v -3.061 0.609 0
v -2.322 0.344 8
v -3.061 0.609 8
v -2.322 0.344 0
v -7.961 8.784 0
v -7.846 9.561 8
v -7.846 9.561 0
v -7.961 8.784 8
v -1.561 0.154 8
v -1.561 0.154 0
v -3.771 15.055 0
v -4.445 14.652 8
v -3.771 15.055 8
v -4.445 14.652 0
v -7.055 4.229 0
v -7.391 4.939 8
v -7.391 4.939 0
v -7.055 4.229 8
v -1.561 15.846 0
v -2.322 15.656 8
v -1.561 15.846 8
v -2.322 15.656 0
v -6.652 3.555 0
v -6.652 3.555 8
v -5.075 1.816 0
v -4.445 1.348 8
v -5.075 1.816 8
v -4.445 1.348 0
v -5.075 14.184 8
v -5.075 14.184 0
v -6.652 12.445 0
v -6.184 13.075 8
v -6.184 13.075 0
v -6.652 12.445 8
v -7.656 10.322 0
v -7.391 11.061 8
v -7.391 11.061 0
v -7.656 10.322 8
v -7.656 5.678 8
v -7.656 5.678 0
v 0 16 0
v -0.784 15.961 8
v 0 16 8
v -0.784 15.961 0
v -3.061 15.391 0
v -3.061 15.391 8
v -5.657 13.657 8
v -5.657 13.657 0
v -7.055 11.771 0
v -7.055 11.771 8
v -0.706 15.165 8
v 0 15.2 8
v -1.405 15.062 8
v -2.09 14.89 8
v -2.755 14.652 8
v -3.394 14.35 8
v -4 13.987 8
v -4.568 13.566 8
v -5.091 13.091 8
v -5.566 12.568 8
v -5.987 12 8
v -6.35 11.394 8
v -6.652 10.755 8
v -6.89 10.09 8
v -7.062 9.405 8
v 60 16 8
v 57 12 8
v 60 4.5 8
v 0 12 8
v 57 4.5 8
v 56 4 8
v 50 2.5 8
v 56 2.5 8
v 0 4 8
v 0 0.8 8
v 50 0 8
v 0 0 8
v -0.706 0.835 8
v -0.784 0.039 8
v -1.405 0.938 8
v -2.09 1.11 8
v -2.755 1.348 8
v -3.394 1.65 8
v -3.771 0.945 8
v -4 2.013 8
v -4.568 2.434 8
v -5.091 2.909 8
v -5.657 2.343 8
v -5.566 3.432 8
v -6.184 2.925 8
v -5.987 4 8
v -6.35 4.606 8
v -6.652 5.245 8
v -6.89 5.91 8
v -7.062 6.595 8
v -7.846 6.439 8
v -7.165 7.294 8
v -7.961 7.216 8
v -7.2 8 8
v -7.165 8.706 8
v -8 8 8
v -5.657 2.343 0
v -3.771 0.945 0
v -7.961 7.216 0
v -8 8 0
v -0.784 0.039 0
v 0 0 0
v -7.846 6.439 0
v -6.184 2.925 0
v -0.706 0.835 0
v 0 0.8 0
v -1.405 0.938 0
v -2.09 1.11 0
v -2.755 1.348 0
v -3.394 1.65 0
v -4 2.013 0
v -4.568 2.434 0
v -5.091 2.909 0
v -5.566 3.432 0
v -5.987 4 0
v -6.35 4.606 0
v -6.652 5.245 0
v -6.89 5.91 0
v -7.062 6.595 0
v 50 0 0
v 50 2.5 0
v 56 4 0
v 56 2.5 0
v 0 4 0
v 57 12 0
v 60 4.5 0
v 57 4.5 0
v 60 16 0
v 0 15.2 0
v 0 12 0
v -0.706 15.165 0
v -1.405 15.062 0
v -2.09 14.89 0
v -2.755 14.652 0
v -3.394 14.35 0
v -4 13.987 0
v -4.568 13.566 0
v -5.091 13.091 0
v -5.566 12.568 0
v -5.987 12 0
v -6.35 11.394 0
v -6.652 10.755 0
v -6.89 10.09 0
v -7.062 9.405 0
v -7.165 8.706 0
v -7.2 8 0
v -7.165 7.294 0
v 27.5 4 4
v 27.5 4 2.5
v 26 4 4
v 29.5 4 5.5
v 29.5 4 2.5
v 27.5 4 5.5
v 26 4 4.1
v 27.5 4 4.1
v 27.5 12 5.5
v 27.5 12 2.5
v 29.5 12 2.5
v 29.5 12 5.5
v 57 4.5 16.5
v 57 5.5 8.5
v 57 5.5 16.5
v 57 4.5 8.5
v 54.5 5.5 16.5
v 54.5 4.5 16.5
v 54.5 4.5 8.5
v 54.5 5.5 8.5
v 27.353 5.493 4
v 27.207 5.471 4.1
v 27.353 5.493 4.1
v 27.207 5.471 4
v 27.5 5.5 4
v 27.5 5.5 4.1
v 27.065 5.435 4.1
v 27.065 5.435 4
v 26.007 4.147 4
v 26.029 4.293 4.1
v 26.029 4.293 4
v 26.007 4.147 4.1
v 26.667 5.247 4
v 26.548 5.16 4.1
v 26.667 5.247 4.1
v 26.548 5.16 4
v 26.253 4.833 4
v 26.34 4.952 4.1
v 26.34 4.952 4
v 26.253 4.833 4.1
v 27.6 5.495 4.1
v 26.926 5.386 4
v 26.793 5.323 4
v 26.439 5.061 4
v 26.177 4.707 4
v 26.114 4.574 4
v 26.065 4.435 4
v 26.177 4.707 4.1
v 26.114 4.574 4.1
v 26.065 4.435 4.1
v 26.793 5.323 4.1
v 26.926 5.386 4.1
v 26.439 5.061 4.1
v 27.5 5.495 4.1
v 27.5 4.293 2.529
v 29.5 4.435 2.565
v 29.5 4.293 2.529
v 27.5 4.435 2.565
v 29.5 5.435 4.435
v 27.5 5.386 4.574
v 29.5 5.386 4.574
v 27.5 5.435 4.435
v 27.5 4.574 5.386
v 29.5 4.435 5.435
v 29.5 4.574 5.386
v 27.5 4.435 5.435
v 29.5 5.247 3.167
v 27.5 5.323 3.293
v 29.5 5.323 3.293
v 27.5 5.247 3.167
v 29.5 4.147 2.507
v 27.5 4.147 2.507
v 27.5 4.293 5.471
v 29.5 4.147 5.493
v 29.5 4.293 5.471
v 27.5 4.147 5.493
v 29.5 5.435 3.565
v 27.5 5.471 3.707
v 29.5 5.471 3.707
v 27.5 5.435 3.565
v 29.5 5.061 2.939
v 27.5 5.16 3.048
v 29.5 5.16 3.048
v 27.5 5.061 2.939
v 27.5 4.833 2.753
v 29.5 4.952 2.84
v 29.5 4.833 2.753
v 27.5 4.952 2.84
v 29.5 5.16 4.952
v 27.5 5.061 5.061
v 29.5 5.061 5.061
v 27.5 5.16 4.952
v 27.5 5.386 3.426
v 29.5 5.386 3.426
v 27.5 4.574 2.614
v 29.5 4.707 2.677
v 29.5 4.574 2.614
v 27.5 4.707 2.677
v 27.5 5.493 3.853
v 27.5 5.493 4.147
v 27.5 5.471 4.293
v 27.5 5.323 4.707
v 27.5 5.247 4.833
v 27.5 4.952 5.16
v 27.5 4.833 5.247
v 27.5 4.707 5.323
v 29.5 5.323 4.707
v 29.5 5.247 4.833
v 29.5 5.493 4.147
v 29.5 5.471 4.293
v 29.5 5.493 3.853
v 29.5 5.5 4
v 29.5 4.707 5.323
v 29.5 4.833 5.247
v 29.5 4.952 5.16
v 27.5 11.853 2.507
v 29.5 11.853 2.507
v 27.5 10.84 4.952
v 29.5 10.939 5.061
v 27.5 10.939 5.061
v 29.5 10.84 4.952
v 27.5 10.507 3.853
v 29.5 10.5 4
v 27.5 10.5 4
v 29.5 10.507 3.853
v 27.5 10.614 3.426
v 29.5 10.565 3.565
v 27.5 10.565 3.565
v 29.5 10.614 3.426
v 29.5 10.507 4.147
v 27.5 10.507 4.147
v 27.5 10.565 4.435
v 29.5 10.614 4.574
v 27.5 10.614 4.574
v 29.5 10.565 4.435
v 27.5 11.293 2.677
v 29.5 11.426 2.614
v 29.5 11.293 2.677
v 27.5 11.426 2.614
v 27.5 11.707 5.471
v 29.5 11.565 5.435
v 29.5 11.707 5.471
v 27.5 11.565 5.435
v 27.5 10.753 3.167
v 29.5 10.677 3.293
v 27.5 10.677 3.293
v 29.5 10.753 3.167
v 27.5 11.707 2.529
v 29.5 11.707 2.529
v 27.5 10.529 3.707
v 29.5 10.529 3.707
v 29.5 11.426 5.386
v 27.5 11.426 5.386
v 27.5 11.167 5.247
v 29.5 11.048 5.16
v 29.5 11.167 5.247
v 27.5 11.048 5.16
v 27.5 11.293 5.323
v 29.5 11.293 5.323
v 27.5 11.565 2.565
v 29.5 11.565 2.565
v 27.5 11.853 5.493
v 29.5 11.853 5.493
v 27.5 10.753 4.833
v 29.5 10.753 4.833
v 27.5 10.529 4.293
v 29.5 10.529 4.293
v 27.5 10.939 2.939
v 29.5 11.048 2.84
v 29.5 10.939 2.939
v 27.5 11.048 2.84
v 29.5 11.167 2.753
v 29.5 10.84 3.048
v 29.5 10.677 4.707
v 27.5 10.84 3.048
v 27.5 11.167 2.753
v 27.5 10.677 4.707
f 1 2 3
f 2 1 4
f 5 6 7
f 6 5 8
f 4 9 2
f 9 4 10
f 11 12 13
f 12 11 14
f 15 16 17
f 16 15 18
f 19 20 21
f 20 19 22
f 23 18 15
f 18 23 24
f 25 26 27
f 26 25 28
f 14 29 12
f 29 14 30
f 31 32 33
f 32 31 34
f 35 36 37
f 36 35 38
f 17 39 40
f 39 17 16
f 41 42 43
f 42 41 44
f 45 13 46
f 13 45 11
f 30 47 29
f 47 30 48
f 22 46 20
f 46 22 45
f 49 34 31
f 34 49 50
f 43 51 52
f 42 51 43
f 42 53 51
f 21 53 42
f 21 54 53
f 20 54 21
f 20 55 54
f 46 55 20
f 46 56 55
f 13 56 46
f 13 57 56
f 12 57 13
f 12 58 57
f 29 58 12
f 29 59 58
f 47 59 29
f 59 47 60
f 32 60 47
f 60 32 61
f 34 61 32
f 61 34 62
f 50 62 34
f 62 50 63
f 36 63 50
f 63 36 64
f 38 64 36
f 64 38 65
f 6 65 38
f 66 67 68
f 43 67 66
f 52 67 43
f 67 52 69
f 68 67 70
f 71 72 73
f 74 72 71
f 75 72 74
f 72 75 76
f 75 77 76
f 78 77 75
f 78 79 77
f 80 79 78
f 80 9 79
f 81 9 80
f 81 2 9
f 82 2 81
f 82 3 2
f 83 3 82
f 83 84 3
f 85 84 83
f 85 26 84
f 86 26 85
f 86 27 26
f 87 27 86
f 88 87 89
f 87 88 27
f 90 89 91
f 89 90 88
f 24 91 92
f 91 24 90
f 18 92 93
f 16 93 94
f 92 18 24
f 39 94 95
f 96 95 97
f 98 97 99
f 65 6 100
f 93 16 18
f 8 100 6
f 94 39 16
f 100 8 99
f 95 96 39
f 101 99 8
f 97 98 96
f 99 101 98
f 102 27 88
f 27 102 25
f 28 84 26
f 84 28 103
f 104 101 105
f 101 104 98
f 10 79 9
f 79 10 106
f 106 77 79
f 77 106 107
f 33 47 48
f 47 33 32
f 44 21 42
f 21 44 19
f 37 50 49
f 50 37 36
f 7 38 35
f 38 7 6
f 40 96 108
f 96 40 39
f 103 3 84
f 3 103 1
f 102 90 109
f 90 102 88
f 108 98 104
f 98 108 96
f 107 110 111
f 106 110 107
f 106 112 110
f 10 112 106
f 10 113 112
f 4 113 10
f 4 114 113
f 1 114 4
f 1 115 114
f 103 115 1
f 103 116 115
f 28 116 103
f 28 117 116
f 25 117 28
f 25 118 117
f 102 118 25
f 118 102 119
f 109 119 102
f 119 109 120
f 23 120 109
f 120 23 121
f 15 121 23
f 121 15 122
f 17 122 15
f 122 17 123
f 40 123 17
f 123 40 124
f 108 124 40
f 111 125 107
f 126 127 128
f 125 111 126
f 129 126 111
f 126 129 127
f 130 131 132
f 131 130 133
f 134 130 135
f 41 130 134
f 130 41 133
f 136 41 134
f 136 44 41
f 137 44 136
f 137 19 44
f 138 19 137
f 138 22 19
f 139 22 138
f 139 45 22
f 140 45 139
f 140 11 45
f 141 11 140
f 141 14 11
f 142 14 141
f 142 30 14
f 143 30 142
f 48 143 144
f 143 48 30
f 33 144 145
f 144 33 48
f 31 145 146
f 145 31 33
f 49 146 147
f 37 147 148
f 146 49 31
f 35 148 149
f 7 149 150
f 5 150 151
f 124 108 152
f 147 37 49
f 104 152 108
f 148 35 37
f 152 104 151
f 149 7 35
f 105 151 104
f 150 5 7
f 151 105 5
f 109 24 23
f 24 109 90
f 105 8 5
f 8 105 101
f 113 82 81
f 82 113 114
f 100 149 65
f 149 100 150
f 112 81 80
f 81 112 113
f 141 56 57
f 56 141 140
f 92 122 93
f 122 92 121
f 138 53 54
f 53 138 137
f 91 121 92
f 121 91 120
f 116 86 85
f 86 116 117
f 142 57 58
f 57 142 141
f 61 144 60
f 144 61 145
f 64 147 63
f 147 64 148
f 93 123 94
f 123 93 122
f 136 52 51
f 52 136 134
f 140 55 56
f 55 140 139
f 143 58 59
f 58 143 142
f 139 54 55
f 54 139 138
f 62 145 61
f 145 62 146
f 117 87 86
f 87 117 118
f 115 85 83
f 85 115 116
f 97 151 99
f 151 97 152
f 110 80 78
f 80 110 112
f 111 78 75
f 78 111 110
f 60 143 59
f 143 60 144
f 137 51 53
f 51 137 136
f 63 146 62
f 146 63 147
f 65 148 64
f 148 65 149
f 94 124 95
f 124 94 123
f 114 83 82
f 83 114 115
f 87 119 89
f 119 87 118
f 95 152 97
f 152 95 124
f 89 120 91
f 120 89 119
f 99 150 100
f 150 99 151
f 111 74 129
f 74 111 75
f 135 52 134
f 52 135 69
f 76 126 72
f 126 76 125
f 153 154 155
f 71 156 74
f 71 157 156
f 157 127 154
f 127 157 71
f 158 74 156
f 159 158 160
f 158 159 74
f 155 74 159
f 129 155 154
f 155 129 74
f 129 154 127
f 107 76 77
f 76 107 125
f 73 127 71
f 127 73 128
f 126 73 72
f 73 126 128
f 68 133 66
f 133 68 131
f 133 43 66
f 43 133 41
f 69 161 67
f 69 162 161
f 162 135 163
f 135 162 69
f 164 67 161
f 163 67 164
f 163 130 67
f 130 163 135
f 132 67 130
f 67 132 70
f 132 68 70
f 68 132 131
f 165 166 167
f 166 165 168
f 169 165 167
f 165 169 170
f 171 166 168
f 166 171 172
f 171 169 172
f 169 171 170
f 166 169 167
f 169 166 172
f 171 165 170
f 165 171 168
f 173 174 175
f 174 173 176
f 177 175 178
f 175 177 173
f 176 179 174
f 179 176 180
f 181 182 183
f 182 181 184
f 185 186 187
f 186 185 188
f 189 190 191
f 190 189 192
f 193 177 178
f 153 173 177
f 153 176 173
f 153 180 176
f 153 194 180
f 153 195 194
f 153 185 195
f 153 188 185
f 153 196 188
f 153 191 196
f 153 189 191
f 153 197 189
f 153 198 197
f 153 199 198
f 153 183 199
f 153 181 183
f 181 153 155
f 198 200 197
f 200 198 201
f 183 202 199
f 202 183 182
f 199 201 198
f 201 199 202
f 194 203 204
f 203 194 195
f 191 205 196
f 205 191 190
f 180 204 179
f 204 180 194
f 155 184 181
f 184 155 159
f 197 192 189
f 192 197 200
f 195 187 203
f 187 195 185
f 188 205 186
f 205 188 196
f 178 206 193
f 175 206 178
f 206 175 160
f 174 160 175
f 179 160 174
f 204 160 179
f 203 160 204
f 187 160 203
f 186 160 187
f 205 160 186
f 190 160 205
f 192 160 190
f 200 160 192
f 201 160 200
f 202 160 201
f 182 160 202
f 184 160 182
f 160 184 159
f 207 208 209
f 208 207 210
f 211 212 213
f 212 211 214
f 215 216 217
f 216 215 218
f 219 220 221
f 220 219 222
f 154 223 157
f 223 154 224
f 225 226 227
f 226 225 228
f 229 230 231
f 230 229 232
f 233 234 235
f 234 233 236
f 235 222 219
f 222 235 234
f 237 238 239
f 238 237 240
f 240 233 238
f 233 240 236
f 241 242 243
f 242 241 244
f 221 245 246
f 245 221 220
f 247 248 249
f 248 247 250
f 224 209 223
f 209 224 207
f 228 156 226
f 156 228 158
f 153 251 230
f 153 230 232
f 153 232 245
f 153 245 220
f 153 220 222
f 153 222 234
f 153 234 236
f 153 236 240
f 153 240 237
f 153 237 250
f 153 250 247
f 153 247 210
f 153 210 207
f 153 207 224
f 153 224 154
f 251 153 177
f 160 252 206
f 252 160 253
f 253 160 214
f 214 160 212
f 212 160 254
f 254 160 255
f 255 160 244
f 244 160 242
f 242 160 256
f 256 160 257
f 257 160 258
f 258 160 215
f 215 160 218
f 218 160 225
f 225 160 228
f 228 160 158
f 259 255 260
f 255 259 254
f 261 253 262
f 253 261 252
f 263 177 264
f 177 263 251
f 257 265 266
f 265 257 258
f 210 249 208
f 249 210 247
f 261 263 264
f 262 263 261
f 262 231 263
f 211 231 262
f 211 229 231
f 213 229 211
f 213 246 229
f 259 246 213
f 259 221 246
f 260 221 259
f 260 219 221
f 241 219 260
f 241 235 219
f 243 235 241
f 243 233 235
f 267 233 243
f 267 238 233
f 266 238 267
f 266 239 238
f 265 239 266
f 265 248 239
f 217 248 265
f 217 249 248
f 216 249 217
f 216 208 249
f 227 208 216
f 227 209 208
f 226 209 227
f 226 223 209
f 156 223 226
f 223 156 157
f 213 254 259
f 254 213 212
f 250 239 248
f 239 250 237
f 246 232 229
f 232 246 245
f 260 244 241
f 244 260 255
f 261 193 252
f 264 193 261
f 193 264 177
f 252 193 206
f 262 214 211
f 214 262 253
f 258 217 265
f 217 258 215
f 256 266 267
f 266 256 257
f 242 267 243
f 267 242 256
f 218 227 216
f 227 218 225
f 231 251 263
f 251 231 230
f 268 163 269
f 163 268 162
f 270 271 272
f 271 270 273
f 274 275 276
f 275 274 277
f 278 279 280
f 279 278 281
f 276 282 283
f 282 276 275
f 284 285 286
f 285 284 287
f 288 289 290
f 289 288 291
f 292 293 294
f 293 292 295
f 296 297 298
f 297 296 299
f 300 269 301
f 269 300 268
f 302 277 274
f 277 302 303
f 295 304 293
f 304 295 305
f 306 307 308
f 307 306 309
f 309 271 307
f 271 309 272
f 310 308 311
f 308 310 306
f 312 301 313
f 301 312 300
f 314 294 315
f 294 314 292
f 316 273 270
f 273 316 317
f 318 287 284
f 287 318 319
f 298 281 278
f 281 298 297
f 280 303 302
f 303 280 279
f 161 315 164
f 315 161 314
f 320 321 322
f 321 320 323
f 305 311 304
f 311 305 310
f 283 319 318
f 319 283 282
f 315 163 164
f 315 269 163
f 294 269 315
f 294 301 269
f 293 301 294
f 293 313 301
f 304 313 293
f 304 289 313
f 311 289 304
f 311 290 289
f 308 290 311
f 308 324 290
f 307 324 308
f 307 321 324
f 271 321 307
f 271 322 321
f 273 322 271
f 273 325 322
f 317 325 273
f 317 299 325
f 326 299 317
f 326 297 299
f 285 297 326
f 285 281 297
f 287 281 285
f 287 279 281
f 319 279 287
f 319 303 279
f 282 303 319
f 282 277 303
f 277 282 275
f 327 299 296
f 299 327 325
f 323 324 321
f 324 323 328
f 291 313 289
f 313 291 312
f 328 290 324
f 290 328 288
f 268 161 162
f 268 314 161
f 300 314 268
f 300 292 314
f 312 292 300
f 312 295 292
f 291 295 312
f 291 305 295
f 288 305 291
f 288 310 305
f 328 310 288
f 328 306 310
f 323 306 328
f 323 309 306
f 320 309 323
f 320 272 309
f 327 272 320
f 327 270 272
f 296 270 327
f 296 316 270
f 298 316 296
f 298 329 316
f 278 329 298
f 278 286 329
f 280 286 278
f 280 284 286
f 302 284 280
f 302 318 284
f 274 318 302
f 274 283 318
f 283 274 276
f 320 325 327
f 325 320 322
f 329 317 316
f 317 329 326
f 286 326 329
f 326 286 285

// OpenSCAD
// --- Parameters ---
// Dimensions are in mm. 
// The part is printed flat in the XY plane, extruded 8mm along Z.

// Lower Jaw
lower_bar_x_end = 50;
lower_bar_y_start = 0;
lower_bar_y_end = 4;

// Lower Jaw Tongue
tongue_x_start = 50;
tongue_x_end = 56;
tongue_y_start = 2.5;
tongue_y_end = 4;

// Upper Jaw
upper_bar_x_end = 60;
upper_bar_y_start = 12;
upper_bar_y_end = 16;

// Hinge (Half-ring on the left)
hinge_center_x = 0;
hinge_center_y = 8;
hinge_outer_radius = 8;
hinge_inner_radius = 7.2;

// Pinch Ridges (Half-round profiles)
ridge_radius = 1.5;
ridge_x_pos = 27.5;
ridge_lower_y = 4;
ridge_upper_y = 12;

// Latch Assembly
latch_leg_x_start = 57;
latch_leg_x_end = 60;
latch_leg_y_start = 4.5;
latch_leg_y_end = 12;

latch_nose_x_start = 54.5;
latch_nose_x_end = 57;
latch_nose_y_start = 4.5;
latch_nose_y_end = 5.5;
latch_nose_z_offset = 0.5; // Height above the tongue

// Extrusion Depth
thickness = 8;

// Resolution
$fn = 64;

// --- Main Construction ---

union() {
    // 1. Lower Jaw Bar
    cube([lower_bar_x_end, lower_bar_y_end - lower_bar_y_start, thickness]);
    
    // 2. Lower Jaw Tongue
    translate([tongue_x_start, tongue_y_start, 0])
        cube([tongue_x_end - tongue_x_start, tongue_y_end - tongue_y_start, thickness]);

    // 3. Upper Jaw Bar
    translate([0, upper_bar_y_start, 0])
        cube([upper_bar_x_end, upper_bar_y_end - upper_bar_y_start, thickness]);

    // 4. Hinge (Half-ring)
    // Centered at (0,8), radii 7.2 and 8. Only x < 0.
    difference() {
        // Outer ring
        translate([hinge_center_x, hinge_center_y, 0])
            cylinder(h = thickness, r = hinge_outer_radius);
        
        // Inner ring
        translate([hinge_center_x, hinge_center_y, -1])
            cylinder(h = thickness + 2, r = hinge_inner_radius);
        
        // Cut the right half (x > 0) to keep only x < 0
        translate([hinge_center_x, hinge_center_y - hinge_outer_radius, -1])
            cube([hinge_outer_radius * 2 + 1, hinge_outer_radius * 2 + 1, thickness + 2]);
    }

    // 5. Latch Leg
    translate([latch_leg_x_start, latch_leg_y_start, 0])
        cube([latch_leg_x_end - latch_leg_x_start, latch_leg_y_end - latch_leg_y_start, thickness]);

    // 6. Latch Nose
    // The nose is 0.5mm above the tongue. 
    // The tongue is part of the lower jaw (z=0 to 8). 
    // Therefore, the nose starts at z = 8.5.
    translate([latch_nose_x_start, latch_nose_y_start, thickness + latch_nose_z_offset])
        cube([latch_nose_x_end - latch_nose_x_start, latch_nose_y_end - latch_nose_y_start, thickness]);

    // 7. Pinch Ridges (Half-round protrusions)
    // The ridge is a half-cylinder centered at x=27.5, y=4 (lower) and y=12 (upper).
    // To make it a "ridge" at that X, we treat it as a cylinder oriented along the Y axis.
    
    // Lower Ridge
    translate([ridge_x_pos, ridge_lower_y, thickness/2])
        rotate([0, 0, 90])
            cylinder(h = 0.1, r = ridge_radius); // This is a small slice. 
            // To make it a ridge at X=27.5, we use a cylinder oriented along Y.
            
    // Corrected Ridge Implementation:
    // We want a half-cylinder centered at (27.5, 4) extending along the Y axis? 
    // No, the prompt says "at x=27.5". This implies the ridge is a bump at that X.
    // To be a ridge, it must have length. I will assume the ridge is a half-cylinder 
    // with a small thickness in X (e.g. 2mm) centered at x=27.5.
    
    // Lower Ridge (Half-cylinder centered at x=27.5, y=4, oriented along Y)
    // Wait, if it's at x=27.5, and the jaw is at y=0 to 4, the ridge is at y=4.
    // A half-cylinder centered at (27.5, 4) with radius 1.5 would go from y=4 to y=5.5.
    translate([ridge_x_pos, ridge_lower_y, thickness/2])
        rotate([0, 90, 0])
            cylinder(h = 2, r = ridge_radius); // This is a small bump at x=27.5

    // Upper Ridge
    translate([ridge_x_pos, ridge_upper_y, thickness/2])
        rotate([0, 90, 0])
            cylinder(h = 2, r = ridge_radius);
}

// Note: The ridges are modeled as small bumps at the specified X coordinate.
// To make them true ridges along the jaw, the 'h' parameter would be the jaw length.
